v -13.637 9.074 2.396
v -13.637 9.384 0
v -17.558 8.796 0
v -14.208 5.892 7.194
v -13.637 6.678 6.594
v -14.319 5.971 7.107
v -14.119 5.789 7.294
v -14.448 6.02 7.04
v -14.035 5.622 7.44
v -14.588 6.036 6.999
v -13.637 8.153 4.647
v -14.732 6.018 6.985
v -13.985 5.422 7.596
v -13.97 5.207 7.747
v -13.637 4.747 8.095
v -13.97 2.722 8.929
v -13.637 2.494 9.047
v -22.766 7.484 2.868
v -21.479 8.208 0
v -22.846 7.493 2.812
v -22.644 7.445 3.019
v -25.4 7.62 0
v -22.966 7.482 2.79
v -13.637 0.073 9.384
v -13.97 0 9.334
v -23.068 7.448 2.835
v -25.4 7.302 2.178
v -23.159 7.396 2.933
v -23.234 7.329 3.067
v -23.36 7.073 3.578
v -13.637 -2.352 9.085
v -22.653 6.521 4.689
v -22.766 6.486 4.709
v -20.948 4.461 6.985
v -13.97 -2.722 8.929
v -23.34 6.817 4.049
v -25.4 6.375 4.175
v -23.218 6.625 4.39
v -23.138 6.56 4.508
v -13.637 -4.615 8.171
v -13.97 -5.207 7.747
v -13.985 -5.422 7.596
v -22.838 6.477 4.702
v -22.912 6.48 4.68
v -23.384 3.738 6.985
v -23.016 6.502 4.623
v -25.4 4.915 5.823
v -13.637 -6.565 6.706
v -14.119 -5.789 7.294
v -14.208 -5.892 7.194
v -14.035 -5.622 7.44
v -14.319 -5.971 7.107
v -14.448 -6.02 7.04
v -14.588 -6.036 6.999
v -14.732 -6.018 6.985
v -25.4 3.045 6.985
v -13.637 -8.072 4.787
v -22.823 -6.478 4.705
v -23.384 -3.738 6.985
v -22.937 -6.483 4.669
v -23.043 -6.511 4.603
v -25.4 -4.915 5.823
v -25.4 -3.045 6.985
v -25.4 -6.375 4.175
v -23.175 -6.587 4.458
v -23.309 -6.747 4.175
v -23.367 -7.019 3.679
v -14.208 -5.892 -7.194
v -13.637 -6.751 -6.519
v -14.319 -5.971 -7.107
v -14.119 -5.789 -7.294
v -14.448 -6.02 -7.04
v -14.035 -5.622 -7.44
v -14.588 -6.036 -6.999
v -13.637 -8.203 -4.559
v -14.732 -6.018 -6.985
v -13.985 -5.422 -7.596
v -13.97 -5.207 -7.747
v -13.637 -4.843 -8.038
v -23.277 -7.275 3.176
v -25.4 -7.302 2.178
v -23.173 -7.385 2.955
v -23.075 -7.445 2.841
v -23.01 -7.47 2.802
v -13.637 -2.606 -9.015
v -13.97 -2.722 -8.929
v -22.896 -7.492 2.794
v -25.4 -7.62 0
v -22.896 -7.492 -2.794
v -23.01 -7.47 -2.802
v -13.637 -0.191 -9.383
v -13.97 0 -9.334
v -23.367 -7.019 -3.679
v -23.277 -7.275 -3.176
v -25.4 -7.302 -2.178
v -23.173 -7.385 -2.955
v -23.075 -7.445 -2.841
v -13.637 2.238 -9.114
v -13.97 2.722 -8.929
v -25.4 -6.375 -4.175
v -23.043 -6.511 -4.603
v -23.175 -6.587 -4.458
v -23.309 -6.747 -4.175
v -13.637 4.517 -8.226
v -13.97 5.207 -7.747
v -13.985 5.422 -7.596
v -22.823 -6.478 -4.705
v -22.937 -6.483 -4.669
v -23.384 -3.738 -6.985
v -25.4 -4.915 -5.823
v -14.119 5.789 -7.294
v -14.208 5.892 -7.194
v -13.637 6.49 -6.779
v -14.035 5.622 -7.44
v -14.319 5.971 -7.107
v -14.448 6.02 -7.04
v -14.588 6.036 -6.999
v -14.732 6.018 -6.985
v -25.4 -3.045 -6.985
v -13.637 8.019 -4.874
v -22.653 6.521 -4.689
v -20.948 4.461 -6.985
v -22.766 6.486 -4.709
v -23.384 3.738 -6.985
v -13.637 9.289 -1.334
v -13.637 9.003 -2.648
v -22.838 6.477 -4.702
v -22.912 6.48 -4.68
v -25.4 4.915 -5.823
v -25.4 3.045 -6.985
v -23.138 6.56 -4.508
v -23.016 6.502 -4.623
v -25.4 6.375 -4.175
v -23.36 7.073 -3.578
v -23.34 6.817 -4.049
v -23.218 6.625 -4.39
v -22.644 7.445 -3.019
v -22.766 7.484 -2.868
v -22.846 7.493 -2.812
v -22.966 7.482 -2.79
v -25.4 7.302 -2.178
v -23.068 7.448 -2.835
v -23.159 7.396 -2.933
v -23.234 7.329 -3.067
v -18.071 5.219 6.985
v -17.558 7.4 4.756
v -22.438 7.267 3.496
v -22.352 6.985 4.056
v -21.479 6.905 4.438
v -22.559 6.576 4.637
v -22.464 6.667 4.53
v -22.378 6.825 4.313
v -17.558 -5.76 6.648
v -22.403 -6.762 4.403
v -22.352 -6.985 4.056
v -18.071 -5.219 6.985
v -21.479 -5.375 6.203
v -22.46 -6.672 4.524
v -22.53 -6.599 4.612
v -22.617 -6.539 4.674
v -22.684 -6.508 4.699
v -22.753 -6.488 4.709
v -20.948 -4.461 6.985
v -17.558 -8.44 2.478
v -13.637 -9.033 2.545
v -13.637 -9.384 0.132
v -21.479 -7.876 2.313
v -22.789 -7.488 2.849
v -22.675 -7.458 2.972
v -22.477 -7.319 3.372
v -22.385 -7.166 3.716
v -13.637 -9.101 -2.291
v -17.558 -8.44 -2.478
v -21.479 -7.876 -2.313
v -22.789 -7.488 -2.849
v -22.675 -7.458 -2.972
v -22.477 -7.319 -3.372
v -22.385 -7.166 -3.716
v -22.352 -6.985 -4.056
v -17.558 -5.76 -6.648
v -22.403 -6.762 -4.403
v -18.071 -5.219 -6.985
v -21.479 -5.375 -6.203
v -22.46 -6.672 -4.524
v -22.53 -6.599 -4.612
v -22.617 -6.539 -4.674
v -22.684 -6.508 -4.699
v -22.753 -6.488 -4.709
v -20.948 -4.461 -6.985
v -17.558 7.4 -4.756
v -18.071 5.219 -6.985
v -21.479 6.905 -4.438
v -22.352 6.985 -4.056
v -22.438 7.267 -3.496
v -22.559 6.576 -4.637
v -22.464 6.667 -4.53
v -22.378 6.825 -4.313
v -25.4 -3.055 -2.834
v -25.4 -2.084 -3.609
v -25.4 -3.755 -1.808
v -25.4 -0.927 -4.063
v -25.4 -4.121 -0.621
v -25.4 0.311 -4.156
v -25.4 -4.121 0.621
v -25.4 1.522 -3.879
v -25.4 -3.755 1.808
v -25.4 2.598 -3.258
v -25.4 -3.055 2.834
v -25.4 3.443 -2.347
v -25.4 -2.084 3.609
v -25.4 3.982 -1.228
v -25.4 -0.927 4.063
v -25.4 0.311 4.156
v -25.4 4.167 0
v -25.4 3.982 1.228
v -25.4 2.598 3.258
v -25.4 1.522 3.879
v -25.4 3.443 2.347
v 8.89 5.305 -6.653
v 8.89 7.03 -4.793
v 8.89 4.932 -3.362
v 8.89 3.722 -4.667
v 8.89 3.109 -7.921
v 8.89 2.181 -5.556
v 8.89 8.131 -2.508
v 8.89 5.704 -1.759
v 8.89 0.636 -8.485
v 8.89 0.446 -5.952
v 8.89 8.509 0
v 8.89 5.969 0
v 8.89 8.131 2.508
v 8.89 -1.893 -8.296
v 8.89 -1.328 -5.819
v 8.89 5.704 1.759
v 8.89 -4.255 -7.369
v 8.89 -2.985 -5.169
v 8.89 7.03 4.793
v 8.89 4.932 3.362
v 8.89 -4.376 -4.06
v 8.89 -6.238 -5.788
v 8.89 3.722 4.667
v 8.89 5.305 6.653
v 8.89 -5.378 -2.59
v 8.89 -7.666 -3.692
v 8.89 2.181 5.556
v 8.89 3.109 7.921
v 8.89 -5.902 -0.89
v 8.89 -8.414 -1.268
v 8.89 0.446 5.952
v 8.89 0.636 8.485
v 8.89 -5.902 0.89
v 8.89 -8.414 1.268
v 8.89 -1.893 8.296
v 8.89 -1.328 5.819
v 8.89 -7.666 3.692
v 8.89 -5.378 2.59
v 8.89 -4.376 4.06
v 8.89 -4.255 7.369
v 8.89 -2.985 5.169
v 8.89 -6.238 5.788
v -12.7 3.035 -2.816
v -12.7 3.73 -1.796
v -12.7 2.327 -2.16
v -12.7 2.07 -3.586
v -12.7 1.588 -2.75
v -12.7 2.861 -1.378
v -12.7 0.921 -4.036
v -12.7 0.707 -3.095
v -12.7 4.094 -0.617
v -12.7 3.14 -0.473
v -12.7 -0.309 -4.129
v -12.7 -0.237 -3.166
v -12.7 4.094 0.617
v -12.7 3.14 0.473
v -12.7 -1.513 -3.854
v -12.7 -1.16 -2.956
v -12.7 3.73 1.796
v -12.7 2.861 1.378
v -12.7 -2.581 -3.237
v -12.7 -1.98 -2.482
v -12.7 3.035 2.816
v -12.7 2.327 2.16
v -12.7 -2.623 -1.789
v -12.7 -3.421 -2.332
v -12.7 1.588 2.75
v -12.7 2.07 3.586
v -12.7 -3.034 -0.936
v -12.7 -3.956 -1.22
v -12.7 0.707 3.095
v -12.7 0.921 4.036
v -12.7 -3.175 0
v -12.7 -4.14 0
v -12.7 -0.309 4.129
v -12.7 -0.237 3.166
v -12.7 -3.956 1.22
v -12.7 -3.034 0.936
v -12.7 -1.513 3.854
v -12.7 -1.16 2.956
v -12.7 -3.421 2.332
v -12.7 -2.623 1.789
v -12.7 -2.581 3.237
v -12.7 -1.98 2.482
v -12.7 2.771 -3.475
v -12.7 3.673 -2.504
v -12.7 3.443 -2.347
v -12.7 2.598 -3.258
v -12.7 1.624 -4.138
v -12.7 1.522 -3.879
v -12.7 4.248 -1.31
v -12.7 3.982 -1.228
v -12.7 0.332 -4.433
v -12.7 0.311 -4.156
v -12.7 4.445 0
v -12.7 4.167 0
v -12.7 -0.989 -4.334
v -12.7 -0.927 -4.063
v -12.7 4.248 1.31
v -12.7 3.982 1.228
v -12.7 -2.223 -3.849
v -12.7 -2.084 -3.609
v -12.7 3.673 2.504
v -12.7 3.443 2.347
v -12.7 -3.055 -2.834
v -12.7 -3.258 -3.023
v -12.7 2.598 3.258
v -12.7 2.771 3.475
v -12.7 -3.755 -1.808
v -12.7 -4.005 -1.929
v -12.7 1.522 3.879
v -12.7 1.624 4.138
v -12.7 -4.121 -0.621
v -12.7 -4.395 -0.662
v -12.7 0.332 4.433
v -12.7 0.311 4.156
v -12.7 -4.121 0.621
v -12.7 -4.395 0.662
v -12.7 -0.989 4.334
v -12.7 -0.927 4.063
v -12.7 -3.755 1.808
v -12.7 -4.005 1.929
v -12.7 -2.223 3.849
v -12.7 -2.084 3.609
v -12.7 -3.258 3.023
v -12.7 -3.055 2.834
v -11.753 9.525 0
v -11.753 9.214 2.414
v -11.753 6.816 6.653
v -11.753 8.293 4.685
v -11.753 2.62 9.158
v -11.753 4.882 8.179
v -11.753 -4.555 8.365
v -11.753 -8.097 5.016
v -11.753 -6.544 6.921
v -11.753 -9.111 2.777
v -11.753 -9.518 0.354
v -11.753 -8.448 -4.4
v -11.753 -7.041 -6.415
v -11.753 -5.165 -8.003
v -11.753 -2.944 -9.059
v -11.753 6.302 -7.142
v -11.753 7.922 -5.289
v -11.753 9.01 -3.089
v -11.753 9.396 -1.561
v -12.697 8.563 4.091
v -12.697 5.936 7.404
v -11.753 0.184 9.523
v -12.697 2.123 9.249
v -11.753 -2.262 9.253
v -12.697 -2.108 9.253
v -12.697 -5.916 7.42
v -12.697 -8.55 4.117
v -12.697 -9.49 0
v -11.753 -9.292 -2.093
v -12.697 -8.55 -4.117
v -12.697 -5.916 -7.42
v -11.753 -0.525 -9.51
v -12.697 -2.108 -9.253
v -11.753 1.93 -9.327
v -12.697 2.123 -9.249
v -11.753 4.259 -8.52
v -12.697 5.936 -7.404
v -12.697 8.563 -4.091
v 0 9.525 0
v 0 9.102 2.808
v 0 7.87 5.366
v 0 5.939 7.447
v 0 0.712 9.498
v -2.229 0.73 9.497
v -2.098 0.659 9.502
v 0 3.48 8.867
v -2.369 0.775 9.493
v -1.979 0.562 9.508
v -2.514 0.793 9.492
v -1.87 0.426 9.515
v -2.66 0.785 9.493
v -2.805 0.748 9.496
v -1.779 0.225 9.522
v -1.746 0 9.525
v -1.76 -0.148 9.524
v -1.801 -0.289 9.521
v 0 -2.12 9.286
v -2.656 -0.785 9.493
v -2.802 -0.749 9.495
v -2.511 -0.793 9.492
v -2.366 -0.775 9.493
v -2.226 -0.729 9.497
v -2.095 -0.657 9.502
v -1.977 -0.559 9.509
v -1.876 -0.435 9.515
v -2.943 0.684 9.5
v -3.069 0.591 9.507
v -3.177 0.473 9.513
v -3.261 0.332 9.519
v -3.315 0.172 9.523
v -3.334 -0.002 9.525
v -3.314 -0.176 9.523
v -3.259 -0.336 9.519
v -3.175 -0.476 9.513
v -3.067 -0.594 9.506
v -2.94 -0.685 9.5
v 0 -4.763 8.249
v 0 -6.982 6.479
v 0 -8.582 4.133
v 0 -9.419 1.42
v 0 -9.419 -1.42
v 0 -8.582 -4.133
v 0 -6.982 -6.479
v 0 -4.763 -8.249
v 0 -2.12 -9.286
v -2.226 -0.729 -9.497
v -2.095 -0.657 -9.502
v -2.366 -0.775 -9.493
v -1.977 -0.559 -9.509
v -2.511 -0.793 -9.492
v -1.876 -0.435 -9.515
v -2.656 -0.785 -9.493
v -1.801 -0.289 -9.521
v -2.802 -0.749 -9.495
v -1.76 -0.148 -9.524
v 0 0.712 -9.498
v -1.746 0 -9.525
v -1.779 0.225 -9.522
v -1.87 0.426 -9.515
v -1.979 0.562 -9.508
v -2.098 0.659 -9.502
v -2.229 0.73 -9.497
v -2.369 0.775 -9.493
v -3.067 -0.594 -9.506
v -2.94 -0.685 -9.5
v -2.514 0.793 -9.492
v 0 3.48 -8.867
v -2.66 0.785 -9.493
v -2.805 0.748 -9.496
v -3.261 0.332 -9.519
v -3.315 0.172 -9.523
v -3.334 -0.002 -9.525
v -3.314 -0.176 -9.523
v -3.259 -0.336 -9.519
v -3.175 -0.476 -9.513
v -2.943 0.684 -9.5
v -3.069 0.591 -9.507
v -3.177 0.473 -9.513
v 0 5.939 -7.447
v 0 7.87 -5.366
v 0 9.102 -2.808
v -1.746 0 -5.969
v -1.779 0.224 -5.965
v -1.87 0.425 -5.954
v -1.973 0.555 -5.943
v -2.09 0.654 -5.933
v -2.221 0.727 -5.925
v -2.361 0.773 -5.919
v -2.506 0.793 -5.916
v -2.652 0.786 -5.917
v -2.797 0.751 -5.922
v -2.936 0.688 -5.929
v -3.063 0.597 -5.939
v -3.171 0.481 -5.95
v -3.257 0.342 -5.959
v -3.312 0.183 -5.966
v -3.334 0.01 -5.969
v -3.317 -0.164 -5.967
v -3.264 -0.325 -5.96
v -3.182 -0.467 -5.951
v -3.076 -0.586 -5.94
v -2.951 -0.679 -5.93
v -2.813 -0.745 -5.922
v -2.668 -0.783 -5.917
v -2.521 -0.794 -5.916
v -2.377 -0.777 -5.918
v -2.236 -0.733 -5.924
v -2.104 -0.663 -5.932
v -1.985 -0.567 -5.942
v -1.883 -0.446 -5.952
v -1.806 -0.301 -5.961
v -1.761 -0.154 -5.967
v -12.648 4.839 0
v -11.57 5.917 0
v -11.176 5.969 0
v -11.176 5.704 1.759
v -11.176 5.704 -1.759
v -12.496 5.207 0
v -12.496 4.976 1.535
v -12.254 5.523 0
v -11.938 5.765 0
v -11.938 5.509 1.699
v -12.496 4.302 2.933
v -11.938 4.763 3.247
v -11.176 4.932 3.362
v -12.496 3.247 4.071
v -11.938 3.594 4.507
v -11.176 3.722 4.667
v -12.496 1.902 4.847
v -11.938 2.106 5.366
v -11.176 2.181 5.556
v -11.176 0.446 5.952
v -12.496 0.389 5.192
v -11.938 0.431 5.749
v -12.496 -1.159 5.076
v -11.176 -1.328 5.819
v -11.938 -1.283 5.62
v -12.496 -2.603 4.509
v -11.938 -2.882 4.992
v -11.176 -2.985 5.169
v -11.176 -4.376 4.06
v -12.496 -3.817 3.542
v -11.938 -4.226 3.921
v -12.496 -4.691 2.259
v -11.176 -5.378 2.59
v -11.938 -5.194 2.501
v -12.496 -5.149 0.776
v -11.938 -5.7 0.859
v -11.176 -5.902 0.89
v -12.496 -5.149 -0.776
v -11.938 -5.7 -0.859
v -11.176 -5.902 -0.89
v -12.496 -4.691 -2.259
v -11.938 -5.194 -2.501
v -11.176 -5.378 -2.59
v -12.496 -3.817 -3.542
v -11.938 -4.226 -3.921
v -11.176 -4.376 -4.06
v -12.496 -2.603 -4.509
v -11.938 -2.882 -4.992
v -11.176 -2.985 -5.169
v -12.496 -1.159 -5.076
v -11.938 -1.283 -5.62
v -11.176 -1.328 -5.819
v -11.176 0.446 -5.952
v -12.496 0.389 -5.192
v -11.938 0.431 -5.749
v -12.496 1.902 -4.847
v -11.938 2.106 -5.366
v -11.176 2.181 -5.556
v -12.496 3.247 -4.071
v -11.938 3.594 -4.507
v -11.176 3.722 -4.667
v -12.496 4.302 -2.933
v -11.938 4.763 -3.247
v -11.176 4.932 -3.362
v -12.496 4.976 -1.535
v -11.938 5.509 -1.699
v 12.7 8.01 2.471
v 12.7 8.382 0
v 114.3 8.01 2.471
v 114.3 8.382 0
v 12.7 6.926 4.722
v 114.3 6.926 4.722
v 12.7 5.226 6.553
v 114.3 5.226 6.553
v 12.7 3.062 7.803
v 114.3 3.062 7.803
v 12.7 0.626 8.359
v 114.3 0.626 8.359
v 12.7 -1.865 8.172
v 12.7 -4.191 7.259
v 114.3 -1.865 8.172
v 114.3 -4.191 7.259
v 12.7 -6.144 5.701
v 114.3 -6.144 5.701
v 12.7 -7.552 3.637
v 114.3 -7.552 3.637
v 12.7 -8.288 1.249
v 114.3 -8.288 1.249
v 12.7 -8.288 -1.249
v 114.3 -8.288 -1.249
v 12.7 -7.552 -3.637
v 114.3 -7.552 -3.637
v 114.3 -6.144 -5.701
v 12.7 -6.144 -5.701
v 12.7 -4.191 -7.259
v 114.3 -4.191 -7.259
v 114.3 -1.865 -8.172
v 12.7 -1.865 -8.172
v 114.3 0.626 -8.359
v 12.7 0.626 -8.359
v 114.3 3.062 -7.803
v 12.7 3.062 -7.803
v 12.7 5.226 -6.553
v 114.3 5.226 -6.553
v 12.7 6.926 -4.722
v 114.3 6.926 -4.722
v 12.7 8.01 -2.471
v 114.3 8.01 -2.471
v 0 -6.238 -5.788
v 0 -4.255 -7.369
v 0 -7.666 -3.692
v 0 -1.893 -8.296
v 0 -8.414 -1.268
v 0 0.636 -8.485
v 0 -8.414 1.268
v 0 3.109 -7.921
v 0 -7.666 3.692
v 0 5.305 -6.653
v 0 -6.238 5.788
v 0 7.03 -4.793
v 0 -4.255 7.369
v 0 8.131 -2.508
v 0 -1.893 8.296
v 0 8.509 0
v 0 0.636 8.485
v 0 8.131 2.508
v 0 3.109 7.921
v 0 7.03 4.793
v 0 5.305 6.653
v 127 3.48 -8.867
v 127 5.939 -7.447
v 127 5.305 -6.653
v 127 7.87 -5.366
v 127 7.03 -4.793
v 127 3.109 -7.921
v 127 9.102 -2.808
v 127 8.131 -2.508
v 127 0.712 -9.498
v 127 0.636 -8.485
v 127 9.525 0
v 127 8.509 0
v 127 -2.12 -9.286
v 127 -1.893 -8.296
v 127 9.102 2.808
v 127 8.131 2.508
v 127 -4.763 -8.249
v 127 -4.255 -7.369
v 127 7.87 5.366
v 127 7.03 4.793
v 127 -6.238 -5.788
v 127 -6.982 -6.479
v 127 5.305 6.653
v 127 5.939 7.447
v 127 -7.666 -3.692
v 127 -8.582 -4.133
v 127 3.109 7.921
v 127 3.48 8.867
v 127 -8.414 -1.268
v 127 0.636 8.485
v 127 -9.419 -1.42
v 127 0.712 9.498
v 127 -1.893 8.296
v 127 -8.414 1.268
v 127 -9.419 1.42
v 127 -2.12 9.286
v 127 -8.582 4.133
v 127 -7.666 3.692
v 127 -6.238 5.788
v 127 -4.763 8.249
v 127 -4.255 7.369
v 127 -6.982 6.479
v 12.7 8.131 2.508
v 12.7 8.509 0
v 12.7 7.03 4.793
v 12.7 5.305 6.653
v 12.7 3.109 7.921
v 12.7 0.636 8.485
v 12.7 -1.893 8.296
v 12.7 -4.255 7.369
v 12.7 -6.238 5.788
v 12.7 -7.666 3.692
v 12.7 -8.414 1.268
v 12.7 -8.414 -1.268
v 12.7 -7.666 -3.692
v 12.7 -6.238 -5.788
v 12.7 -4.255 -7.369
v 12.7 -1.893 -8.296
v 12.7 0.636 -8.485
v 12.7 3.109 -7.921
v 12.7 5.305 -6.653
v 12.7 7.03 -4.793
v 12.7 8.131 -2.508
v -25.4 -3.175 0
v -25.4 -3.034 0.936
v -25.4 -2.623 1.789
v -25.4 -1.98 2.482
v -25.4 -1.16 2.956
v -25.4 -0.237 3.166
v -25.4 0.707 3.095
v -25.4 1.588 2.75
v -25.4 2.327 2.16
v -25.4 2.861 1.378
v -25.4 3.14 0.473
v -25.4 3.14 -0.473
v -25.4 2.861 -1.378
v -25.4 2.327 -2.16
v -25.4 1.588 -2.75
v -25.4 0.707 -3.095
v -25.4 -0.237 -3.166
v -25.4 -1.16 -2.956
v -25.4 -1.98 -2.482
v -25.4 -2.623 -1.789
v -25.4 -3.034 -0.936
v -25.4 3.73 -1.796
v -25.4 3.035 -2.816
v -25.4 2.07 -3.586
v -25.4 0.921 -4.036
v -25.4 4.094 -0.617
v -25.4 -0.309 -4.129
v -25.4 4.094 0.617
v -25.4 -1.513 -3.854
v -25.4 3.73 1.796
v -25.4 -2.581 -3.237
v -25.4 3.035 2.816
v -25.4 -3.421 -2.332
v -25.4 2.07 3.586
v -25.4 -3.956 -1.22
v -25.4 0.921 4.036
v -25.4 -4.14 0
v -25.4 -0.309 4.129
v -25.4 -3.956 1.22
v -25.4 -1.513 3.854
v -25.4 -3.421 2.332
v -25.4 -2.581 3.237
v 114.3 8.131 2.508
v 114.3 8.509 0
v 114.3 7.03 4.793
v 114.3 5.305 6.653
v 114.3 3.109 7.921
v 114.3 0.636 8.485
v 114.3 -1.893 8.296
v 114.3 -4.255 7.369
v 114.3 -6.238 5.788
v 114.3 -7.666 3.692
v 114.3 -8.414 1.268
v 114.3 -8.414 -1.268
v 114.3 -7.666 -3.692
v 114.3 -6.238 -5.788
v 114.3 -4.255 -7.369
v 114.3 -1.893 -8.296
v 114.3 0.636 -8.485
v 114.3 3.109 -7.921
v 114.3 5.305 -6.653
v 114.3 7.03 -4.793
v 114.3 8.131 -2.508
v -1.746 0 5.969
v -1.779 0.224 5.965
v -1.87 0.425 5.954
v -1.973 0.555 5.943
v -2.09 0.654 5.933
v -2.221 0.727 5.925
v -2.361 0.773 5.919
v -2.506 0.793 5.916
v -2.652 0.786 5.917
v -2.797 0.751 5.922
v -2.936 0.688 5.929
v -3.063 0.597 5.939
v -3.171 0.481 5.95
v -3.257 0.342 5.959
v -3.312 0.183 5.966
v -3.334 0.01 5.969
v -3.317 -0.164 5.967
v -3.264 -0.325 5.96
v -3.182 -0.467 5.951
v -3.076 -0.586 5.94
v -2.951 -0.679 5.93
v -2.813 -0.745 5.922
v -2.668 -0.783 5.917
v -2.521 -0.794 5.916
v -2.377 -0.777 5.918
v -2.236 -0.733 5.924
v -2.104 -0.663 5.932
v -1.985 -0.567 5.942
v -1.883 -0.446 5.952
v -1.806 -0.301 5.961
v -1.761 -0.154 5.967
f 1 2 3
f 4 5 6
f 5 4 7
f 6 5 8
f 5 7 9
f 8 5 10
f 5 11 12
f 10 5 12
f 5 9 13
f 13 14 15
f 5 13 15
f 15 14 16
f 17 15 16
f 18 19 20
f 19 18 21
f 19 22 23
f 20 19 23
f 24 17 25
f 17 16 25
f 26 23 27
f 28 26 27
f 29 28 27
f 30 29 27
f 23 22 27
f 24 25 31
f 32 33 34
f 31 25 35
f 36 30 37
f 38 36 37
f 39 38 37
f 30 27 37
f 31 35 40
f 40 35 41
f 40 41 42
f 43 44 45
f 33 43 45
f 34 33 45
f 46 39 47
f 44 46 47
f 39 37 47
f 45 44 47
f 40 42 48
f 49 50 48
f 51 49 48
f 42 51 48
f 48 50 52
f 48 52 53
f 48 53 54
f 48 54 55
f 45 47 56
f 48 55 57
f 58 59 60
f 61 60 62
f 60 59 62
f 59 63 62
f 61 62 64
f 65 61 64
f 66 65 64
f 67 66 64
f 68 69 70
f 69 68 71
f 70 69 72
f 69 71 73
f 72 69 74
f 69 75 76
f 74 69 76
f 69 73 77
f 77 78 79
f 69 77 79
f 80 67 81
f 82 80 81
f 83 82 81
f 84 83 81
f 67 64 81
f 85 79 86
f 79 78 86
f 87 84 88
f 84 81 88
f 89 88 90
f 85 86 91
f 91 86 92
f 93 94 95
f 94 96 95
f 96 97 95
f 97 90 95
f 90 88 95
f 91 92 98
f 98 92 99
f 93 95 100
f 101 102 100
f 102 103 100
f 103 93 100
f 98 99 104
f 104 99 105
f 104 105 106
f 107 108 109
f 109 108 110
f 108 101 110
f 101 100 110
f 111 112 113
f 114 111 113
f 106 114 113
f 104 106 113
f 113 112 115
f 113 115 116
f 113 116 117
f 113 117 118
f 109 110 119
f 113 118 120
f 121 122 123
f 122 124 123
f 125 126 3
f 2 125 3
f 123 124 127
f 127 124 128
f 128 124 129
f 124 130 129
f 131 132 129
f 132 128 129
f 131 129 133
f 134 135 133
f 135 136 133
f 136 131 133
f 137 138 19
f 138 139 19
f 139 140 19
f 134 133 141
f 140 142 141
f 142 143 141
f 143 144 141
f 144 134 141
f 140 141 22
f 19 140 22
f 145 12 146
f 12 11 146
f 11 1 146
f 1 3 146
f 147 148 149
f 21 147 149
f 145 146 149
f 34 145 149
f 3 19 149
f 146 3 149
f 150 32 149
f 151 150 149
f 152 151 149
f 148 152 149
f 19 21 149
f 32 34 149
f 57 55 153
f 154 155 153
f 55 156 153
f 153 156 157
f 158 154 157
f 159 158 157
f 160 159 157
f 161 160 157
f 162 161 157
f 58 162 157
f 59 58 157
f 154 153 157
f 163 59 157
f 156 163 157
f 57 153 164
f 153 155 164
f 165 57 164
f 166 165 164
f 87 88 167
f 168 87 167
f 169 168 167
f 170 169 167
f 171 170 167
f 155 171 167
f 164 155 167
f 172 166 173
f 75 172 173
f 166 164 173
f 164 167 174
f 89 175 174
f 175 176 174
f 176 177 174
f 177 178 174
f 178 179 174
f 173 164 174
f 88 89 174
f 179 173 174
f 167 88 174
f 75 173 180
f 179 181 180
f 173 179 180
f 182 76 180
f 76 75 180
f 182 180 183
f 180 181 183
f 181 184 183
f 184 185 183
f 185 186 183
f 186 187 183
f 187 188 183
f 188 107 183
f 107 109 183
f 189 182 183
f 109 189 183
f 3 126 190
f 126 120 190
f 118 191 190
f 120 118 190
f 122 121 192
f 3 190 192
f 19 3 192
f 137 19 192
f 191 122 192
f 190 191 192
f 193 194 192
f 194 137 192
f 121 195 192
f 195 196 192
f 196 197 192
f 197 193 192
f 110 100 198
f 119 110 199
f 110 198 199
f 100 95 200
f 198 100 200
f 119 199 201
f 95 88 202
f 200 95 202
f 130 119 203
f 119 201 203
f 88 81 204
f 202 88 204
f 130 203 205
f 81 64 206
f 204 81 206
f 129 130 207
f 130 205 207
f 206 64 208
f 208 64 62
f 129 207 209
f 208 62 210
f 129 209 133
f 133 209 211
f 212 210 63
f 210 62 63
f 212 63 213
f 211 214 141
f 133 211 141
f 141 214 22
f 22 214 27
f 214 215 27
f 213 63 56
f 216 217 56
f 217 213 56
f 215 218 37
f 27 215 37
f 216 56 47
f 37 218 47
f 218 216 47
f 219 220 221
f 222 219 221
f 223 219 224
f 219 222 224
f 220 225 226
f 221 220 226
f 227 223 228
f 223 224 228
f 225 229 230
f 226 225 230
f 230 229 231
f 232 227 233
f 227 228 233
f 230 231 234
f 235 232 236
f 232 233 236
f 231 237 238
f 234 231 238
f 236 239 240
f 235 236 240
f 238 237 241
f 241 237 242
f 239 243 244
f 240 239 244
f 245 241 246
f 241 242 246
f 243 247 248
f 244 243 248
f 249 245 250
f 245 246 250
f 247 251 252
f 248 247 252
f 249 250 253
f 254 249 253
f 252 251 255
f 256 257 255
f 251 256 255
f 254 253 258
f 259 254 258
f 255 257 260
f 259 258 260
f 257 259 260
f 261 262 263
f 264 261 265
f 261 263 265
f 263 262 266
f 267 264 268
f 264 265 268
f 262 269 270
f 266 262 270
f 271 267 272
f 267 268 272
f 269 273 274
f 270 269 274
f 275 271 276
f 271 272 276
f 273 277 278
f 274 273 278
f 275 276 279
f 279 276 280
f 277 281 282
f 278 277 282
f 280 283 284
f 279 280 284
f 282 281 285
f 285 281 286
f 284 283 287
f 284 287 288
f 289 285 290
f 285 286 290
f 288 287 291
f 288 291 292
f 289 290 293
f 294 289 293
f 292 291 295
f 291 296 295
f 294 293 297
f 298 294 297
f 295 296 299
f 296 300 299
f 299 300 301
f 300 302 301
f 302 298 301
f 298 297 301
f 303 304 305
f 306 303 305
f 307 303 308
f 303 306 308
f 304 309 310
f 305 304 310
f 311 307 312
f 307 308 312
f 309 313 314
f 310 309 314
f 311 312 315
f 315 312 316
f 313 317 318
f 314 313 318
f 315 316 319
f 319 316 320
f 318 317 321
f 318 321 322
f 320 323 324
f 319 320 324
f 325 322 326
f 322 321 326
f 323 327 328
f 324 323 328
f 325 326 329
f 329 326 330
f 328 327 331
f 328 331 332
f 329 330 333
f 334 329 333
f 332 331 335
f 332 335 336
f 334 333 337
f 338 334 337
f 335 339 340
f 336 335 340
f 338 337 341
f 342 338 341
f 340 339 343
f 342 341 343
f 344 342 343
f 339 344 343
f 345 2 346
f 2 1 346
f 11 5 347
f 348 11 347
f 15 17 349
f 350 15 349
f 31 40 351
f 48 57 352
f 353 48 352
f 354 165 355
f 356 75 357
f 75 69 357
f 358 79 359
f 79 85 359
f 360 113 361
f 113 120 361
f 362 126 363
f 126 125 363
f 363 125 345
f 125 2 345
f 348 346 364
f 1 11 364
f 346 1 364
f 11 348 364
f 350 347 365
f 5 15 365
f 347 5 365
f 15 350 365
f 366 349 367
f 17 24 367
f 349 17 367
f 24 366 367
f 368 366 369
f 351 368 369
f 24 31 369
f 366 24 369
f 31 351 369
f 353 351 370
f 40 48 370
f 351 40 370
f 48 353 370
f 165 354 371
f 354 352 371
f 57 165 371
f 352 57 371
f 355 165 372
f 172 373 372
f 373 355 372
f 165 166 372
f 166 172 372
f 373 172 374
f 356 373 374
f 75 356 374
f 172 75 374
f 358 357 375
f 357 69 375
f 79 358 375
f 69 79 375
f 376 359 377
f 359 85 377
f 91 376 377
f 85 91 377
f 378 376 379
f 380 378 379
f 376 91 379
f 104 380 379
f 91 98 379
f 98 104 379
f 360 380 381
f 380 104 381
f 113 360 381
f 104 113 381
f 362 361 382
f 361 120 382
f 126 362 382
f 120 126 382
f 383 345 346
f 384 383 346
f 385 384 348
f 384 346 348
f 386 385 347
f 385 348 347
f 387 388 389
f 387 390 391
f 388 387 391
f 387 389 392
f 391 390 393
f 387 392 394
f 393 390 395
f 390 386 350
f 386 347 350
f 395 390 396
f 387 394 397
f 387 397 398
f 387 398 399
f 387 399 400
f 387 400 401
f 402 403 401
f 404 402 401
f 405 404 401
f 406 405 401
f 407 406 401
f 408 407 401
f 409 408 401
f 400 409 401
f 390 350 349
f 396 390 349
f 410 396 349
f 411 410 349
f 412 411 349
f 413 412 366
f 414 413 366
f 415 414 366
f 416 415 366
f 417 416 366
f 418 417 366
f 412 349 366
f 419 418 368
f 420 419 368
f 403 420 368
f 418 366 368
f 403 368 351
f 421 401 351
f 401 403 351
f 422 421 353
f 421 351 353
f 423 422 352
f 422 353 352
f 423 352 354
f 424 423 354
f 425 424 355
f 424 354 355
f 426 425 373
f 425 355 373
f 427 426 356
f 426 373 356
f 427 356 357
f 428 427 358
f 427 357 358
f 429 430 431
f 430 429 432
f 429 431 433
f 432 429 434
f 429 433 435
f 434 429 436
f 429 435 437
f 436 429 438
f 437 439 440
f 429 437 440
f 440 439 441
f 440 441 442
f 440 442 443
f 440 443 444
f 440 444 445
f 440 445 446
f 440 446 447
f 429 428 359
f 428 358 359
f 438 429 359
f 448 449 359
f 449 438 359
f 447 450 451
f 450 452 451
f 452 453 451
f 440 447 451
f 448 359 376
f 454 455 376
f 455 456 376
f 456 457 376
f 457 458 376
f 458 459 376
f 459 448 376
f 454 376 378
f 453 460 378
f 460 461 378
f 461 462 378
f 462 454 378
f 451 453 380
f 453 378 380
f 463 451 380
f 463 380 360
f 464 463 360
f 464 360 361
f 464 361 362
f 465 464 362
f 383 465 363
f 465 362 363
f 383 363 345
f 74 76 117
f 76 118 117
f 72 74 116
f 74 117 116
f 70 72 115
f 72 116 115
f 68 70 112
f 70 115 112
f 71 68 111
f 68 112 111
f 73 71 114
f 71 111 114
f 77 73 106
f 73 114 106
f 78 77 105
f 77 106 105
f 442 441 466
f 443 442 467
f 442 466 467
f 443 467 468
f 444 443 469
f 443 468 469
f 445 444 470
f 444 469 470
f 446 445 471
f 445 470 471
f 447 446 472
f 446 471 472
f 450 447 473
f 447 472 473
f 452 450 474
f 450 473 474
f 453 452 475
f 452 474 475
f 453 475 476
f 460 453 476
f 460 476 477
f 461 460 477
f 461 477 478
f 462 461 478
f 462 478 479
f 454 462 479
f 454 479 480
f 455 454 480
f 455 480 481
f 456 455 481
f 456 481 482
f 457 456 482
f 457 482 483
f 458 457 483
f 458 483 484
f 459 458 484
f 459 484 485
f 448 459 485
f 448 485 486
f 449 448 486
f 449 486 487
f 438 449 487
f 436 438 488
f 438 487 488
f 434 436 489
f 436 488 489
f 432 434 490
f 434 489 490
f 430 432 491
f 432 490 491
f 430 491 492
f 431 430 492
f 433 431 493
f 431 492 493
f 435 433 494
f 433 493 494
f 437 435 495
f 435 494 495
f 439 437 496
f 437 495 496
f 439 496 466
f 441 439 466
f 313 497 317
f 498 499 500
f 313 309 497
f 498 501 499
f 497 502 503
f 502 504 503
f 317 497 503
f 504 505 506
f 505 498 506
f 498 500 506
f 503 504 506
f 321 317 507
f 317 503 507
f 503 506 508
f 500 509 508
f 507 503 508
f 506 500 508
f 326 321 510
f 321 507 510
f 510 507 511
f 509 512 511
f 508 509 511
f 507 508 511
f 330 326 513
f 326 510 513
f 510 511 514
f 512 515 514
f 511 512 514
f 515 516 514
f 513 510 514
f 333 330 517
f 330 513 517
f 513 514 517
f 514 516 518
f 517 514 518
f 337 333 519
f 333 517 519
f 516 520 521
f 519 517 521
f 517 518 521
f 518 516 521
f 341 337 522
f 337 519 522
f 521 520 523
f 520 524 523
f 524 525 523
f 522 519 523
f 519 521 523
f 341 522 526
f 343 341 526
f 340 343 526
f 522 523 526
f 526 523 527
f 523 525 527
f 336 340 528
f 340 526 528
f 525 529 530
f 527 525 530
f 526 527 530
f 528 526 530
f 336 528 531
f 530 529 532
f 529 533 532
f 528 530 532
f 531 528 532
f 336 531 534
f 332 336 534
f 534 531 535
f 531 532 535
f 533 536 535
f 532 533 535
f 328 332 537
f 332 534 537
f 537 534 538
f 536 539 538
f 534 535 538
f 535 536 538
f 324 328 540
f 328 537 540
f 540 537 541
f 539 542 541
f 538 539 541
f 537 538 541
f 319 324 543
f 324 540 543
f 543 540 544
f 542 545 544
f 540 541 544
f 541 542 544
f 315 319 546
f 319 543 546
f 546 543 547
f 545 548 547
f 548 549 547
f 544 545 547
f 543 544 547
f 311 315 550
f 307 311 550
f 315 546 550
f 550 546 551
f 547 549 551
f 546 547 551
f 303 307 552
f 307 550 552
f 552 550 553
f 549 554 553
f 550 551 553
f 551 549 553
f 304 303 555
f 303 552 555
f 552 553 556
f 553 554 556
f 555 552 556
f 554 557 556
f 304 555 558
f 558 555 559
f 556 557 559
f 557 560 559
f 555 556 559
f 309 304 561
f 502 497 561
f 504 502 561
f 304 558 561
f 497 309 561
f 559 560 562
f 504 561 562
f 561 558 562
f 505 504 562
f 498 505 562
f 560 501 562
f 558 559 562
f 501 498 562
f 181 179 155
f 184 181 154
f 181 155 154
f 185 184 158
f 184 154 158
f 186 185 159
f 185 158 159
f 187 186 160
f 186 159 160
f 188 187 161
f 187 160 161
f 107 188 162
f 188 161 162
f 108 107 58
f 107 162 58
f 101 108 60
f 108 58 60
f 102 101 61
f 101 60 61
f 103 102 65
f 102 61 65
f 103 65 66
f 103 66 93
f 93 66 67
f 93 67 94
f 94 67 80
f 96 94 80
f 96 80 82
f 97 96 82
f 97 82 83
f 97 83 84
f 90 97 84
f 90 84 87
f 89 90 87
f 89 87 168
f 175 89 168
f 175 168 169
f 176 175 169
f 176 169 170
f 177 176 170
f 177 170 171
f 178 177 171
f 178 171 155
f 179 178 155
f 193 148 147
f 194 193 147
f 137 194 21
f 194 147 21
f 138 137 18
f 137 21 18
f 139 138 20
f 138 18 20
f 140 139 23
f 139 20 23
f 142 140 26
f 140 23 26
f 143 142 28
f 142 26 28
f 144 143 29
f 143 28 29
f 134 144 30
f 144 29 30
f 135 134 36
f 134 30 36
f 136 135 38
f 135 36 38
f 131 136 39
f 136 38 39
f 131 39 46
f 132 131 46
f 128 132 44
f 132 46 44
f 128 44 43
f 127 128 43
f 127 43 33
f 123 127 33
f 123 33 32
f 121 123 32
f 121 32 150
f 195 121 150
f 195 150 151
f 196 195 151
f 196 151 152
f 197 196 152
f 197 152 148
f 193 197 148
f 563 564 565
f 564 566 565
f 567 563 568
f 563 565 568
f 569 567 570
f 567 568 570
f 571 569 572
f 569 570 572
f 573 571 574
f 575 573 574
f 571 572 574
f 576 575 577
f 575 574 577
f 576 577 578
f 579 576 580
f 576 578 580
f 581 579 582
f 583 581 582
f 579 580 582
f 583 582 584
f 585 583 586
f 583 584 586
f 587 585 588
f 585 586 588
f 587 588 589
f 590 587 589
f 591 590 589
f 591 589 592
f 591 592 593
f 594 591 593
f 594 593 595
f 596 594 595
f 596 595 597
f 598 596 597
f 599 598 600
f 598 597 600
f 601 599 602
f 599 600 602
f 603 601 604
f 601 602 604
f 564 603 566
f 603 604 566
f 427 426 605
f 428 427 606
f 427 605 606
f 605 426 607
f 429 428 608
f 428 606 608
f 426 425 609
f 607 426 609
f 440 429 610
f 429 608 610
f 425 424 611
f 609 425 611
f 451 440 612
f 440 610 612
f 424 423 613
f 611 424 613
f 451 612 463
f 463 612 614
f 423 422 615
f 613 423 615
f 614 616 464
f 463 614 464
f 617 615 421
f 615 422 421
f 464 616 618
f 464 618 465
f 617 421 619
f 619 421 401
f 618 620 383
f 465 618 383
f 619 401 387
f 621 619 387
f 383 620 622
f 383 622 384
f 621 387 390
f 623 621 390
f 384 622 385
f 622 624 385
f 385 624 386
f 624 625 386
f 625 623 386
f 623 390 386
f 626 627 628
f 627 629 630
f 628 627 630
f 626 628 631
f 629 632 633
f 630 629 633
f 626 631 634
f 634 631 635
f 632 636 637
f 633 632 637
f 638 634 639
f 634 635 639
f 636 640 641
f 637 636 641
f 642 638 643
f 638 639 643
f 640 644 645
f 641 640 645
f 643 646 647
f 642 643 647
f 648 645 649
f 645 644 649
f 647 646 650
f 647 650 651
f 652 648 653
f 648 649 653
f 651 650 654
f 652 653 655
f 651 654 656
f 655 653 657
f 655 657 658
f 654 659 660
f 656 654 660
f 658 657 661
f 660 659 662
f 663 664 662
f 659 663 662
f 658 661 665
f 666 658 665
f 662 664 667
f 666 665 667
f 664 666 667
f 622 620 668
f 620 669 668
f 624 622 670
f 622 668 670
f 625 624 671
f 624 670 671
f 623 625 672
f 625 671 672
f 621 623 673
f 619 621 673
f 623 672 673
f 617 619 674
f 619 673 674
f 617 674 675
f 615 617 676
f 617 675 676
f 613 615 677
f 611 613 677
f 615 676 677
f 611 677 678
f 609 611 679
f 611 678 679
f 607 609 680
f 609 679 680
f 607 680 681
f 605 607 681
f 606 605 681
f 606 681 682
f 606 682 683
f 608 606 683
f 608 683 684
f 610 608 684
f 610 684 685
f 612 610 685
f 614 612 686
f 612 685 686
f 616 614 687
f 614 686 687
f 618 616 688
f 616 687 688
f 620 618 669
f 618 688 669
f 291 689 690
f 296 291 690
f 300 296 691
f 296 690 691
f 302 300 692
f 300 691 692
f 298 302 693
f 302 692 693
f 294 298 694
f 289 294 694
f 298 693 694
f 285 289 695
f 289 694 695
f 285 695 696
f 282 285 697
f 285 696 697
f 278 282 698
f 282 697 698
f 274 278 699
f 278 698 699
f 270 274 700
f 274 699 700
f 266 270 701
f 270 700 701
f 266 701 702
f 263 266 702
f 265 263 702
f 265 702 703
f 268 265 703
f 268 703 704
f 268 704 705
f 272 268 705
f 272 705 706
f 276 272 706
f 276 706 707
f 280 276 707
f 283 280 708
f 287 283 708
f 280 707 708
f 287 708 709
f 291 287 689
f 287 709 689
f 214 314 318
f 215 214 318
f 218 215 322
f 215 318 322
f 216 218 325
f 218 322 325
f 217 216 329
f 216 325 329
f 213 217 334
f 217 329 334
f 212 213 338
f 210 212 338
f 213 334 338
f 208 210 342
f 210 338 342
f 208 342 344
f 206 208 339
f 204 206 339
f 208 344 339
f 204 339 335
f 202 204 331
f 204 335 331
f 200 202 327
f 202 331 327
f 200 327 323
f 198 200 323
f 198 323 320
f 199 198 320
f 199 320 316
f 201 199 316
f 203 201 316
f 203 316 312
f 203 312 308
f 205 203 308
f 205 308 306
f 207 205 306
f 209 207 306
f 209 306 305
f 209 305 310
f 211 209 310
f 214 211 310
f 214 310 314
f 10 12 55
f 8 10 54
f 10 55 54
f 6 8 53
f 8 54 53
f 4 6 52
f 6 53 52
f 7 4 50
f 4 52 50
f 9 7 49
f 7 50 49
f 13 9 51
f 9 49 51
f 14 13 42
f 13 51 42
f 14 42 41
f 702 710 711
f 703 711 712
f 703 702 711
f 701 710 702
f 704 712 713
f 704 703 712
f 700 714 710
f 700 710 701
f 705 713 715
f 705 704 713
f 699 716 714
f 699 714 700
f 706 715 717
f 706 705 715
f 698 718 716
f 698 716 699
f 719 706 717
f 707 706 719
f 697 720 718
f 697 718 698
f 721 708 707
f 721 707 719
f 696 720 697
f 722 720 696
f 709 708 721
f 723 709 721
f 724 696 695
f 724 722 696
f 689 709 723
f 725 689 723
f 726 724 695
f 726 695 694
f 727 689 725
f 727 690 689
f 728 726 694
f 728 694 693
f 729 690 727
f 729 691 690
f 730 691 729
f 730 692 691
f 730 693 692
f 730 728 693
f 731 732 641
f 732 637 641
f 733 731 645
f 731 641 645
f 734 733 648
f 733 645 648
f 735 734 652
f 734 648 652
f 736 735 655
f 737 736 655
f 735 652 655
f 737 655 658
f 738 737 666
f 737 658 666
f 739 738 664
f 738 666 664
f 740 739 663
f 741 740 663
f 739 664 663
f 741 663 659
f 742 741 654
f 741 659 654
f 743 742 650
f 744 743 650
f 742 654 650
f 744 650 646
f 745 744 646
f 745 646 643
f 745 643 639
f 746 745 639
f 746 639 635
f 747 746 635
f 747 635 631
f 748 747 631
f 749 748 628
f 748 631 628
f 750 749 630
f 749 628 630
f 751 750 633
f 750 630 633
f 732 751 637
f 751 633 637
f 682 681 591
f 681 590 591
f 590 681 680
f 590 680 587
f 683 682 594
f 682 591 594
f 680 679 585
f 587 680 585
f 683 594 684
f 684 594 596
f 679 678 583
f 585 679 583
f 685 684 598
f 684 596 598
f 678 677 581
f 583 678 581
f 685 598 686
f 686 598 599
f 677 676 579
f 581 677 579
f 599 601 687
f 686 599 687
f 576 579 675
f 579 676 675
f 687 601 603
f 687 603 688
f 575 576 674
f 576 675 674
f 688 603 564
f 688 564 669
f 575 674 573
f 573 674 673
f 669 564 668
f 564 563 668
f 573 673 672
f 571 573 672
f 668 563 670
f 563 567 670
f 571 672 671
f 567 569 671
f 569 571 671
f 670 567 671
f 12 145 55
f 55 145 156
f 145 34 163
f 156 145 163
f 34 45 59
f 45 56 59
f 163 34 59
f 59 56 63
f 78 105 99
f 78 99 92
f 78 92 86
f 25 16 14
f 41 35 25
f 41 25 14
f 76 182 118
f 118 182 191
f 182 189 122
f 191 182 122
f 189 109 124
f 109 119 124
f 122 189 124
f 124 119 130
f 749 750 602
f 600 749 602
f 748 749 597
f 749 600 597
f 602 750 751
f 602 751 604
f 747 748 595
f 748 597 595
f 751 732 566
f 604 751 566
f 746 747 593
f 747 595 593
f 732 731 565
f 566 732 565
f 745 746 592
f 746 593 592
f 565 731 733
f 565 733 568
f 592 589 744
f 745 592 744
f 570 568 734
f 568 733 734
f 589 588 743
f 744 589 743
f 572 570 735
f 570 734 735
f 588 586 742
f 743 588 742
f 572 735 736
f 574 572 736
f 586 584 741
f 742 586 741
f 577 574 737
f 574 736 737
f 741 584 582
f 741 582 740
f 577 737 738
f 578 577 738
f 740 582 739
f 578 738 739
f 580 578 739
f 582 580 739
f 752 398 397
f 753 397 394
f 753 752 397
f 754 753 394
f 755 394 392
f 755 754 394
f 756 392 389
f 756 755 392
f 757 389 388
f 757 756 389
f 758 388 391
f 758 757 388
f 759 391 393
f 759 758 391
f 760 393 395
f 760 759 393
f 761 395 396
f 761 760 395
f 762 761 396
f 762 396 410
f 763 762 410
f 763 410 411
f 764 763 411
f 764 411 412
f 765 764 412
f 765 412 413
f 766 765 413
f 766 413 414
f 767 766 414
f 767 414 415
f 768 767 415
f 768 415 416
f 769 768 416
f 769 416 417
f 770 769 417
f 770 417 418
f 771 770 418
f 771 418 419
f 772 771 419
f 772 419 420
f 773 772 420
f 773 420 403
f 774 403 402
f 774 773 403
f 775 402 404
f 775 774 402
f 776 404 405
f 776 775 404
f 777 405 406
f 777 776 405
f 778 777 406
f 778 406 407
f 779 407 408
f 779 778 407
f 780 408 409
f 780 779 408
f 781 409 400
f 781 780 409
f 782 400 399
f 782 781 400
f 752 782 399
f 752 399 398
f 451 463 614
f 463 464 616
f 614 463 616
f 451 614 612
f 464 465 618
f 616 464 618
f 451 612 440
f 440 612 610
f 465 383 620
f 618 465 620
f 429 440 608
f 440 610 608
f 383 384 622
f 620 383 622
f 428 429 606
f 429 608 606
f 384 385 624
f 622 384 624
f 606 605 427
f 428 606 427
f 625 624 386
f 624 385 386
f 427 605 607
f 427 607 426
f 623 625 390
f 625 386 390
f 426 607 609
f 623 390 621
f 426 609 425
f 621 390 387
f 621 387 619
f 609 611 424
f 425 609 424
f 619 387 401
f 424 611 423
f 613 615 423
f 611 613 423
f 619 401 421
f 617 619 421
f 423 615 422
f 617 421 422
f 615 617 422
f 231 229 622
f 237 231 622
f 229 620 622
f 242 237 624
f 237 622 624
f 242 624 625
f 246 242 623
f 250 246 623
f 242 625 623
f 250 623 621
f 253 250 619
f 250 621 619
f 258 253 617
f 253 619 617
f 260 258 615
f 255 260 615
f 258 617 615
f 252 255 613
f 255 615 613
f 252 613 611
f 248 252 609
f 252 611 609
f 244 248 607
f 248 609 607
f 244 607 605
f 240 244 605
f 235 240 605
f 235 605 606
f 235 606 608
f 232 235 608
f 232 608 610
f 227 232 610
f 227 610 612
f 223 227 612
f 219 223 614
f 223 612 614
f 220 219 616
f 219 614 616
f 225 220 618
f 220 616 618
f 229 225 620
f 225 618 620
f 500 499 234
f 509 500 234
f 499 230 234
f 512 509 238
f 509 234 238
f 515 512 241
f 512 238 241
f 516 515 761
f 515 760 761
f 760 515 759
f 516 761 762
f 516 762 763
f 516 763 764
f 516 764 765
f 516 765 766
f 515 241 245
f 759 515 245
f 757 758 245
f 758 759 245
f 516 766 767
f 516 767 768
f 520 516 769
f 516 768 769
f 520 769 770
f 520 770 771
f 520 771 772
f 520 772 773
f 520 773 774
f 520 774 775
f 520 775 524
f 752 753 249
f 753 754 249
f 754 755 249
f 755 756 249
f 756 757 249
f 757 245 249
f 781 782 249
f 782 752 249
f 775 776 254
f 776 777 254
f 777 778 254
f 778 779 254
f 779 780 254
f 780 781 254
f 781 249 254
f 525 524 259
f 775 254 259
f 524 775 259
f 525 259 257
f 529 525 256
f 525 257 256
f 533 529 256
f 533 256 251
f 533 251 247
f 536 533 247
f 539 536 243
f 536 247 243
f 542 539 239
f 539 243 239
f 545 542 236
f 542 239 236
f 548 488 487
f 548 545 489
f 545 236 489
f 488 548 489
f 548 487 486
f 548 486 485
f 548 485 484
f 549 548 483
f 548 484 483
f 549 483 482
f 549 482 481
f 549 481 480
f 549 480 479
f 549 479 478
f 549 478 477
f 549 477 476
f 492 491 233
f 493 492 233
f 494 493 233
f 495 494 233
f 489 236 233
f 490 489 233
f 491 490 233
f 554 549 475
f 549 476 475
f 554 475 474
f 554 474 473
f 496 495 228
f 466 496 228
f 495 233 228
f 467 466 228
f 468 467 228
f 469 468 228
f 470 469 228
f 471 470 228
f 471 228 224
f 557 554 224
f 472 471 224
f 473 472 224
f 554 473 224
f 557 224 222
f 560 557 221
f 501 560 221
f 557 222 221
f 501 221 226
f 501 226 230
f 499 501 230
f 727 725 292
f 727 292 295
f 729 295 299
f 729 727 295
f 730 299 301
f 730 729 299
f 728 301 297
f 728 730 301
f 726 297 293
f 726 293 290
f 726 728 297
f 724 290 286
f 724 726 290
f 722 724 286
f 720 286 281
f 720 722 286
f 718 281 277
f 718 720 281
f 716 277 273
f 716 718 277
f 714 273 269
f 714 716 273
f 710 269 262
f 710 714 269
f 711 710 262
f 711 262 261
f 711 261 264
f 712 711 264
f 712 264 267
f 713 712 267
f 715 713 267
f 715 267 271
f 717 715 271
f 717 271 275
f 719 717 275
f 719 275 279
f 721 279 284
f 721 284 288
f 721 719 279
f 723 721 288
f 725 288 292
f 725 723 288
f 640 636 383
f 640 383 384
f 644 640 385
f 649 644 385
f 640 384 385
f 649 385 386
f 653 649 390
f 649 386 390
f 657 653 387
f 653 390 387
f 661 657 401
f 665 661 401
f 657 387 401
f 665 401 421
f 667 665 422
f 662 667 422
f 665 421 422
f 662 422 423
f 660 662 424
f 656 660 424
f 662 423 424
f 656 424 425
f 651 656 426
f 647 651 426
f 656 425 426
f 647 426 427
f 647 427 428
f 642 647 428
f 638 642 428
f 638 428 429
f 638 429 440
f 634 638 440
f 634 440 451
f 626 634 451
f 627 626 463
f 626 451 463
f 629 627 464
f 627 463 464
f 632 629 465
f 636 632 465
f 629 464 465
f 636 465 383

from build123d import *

# Parameters (mm, degrees)
F6_D          = 8.334375
F7_R          = 0.79375
F8_DEPTH      = 9.526
F8_DEPTH_BACK = 9.526
F9_R          = 12.7
F10_R         = 4.1402
F10_R_2       = 3.175
F11_DEPTH     = 12.7
F13_DEPTH     = 11.43
F14_R         = 0.762
F15_R         = 0.508
F16_DEPTH     = 16.5110001


# Not quite as in the source:
# - a length typed as a fraction of an inch, garbled in the dataset ("3 / 203.2 mm" for 3/8 in), is restored


with BuildPart() as f2:
    # F0 (on Top) → F2 (revolve)
    with BuildSketch(Plane.XY):
        Polygon((127, 9.525), (0, 9.525), (0, 8.509), (12.7, 8.509), (12.7, 8.382), (114.3, 8.382), (114.3, 8.509), (127, 8.509), align=None)
    revolve(axis=Axis((12.7, 0, 0), (1, 0, 0)))


with BuildPart() as f4:
    # F3 (on Top) → F4 (revolve)
    with BuildSketch(Plane.XY):
        with BuildLine():
            Line((-25.4, 7.62), (-25.4, 0))
            Line((-25.4, 0), (-12.7, 0))
            Line((-12.7, 0), (-12.7, 4.445))
            ThreePointArc((-12.7, 4.445), (-12.2536307345, 5.5226307345), (-11.176, 5.969))
            Line((-11.176, 5.969), (8.89, 5.969))
            Line((8.89, 5.969), (8.89, 8.509))
            Line((8.89, 8.509), (0, 8.509))
            Line((0, 8.509), (0, 9.525))
            Line((0, 9.525), (-12.7, 9.525))
            Line((-12.7, 9.525), (-25.4, 7.62))
        make_face()
    revolve(axis=Axis((12.7, 0, 0), (1, 0, 0)))

    # F6 (through all)
    with Locations(Plane(origin=(-25.4, 0, 0), x_dir=(0, -1, 0), z_dir=(-1, 0, 0))):
        with Locations((0, 0)):
            Hole(F6_D / 2)

    # F7 (on Top) → F8 (cut, two sides)
    with BuildSketch(Plane.XY) as f8_sk:
        with Locations((-2.54, 0)):
            Circle(F7_R)
    extrude(amount=-F8_DEPTH, mode=Mode.SUBTRACT)
    extrude(f8_sk.sketch, amount=F8_DEPTH_BACK, mode=Mode.SUBTRACT)

    # F9
    f9_edges = [f4.edges().sort_by_distance(p)[0] for p in [
        (-12.7, -9.525, 0),
    ]]
    fillet(f9_edges, radius=F9_R)

    # F12 (on face) → F13 (cut)
    with BuildSketch(Plane(origin=(-25.4, 0, 0), x_dir=(0, -1, 0), z_dir=(-1, 0, 0))):
        with BuildLine():
            ThreePointArc((6.4757547823, 6.985), (0, 9.525), (-6.4757547823, 6.985))
            Line((-6.4757547823, 6.985), (6.4757547823, 6.985))
        make_face()
        with BuildLine():
            Line((6.4757547823, -6.985), (-6.4757547823, -6.985))
            ThreePointArc((-6.4757547823, -6.985), (0, -9.525), (6.4757547823, -6.985))
        make_face()
    extrude(amount=-F13_DEPTH, mode=Mode.SUBTRACT)

    # F14
    f14_edges = [f4.edges().sort_by_distance(p)[0] for p in [
        (-13.97, 0, 6.985),
        (-13.97, 0, -6.985),
    ]]
    fillet(f14_edges, radius=F14_R)

    # F15 (on face) → F16 (cut, through all)
    with BuildSketch(Plane.XY.offset(6.985)):
        with Locations((-22.86, 6.985)):
            Circle(F15_R)
        with Locations((-22.86, -6.985)):
            Circle(F15_R)
    extrude(amount=-F16_DEPTH, mode=Mode.SUBTRACT)


with BuildPart() as f11:
    # F10 (on face) → F11 (new body)
    with BuildSketch(Plane(origin=(-25.4, 0, 0), x_dir=(0, -1, 0), z_dir=(-1, 0, 0))):
        Circle(F10_R)
        Circle(F10_R_2, mode=Mode.SUBTRACT)
    extrude(amount=-F11_DEPTH)


solid = Compound([f2.part, f4.part, f11.part])
